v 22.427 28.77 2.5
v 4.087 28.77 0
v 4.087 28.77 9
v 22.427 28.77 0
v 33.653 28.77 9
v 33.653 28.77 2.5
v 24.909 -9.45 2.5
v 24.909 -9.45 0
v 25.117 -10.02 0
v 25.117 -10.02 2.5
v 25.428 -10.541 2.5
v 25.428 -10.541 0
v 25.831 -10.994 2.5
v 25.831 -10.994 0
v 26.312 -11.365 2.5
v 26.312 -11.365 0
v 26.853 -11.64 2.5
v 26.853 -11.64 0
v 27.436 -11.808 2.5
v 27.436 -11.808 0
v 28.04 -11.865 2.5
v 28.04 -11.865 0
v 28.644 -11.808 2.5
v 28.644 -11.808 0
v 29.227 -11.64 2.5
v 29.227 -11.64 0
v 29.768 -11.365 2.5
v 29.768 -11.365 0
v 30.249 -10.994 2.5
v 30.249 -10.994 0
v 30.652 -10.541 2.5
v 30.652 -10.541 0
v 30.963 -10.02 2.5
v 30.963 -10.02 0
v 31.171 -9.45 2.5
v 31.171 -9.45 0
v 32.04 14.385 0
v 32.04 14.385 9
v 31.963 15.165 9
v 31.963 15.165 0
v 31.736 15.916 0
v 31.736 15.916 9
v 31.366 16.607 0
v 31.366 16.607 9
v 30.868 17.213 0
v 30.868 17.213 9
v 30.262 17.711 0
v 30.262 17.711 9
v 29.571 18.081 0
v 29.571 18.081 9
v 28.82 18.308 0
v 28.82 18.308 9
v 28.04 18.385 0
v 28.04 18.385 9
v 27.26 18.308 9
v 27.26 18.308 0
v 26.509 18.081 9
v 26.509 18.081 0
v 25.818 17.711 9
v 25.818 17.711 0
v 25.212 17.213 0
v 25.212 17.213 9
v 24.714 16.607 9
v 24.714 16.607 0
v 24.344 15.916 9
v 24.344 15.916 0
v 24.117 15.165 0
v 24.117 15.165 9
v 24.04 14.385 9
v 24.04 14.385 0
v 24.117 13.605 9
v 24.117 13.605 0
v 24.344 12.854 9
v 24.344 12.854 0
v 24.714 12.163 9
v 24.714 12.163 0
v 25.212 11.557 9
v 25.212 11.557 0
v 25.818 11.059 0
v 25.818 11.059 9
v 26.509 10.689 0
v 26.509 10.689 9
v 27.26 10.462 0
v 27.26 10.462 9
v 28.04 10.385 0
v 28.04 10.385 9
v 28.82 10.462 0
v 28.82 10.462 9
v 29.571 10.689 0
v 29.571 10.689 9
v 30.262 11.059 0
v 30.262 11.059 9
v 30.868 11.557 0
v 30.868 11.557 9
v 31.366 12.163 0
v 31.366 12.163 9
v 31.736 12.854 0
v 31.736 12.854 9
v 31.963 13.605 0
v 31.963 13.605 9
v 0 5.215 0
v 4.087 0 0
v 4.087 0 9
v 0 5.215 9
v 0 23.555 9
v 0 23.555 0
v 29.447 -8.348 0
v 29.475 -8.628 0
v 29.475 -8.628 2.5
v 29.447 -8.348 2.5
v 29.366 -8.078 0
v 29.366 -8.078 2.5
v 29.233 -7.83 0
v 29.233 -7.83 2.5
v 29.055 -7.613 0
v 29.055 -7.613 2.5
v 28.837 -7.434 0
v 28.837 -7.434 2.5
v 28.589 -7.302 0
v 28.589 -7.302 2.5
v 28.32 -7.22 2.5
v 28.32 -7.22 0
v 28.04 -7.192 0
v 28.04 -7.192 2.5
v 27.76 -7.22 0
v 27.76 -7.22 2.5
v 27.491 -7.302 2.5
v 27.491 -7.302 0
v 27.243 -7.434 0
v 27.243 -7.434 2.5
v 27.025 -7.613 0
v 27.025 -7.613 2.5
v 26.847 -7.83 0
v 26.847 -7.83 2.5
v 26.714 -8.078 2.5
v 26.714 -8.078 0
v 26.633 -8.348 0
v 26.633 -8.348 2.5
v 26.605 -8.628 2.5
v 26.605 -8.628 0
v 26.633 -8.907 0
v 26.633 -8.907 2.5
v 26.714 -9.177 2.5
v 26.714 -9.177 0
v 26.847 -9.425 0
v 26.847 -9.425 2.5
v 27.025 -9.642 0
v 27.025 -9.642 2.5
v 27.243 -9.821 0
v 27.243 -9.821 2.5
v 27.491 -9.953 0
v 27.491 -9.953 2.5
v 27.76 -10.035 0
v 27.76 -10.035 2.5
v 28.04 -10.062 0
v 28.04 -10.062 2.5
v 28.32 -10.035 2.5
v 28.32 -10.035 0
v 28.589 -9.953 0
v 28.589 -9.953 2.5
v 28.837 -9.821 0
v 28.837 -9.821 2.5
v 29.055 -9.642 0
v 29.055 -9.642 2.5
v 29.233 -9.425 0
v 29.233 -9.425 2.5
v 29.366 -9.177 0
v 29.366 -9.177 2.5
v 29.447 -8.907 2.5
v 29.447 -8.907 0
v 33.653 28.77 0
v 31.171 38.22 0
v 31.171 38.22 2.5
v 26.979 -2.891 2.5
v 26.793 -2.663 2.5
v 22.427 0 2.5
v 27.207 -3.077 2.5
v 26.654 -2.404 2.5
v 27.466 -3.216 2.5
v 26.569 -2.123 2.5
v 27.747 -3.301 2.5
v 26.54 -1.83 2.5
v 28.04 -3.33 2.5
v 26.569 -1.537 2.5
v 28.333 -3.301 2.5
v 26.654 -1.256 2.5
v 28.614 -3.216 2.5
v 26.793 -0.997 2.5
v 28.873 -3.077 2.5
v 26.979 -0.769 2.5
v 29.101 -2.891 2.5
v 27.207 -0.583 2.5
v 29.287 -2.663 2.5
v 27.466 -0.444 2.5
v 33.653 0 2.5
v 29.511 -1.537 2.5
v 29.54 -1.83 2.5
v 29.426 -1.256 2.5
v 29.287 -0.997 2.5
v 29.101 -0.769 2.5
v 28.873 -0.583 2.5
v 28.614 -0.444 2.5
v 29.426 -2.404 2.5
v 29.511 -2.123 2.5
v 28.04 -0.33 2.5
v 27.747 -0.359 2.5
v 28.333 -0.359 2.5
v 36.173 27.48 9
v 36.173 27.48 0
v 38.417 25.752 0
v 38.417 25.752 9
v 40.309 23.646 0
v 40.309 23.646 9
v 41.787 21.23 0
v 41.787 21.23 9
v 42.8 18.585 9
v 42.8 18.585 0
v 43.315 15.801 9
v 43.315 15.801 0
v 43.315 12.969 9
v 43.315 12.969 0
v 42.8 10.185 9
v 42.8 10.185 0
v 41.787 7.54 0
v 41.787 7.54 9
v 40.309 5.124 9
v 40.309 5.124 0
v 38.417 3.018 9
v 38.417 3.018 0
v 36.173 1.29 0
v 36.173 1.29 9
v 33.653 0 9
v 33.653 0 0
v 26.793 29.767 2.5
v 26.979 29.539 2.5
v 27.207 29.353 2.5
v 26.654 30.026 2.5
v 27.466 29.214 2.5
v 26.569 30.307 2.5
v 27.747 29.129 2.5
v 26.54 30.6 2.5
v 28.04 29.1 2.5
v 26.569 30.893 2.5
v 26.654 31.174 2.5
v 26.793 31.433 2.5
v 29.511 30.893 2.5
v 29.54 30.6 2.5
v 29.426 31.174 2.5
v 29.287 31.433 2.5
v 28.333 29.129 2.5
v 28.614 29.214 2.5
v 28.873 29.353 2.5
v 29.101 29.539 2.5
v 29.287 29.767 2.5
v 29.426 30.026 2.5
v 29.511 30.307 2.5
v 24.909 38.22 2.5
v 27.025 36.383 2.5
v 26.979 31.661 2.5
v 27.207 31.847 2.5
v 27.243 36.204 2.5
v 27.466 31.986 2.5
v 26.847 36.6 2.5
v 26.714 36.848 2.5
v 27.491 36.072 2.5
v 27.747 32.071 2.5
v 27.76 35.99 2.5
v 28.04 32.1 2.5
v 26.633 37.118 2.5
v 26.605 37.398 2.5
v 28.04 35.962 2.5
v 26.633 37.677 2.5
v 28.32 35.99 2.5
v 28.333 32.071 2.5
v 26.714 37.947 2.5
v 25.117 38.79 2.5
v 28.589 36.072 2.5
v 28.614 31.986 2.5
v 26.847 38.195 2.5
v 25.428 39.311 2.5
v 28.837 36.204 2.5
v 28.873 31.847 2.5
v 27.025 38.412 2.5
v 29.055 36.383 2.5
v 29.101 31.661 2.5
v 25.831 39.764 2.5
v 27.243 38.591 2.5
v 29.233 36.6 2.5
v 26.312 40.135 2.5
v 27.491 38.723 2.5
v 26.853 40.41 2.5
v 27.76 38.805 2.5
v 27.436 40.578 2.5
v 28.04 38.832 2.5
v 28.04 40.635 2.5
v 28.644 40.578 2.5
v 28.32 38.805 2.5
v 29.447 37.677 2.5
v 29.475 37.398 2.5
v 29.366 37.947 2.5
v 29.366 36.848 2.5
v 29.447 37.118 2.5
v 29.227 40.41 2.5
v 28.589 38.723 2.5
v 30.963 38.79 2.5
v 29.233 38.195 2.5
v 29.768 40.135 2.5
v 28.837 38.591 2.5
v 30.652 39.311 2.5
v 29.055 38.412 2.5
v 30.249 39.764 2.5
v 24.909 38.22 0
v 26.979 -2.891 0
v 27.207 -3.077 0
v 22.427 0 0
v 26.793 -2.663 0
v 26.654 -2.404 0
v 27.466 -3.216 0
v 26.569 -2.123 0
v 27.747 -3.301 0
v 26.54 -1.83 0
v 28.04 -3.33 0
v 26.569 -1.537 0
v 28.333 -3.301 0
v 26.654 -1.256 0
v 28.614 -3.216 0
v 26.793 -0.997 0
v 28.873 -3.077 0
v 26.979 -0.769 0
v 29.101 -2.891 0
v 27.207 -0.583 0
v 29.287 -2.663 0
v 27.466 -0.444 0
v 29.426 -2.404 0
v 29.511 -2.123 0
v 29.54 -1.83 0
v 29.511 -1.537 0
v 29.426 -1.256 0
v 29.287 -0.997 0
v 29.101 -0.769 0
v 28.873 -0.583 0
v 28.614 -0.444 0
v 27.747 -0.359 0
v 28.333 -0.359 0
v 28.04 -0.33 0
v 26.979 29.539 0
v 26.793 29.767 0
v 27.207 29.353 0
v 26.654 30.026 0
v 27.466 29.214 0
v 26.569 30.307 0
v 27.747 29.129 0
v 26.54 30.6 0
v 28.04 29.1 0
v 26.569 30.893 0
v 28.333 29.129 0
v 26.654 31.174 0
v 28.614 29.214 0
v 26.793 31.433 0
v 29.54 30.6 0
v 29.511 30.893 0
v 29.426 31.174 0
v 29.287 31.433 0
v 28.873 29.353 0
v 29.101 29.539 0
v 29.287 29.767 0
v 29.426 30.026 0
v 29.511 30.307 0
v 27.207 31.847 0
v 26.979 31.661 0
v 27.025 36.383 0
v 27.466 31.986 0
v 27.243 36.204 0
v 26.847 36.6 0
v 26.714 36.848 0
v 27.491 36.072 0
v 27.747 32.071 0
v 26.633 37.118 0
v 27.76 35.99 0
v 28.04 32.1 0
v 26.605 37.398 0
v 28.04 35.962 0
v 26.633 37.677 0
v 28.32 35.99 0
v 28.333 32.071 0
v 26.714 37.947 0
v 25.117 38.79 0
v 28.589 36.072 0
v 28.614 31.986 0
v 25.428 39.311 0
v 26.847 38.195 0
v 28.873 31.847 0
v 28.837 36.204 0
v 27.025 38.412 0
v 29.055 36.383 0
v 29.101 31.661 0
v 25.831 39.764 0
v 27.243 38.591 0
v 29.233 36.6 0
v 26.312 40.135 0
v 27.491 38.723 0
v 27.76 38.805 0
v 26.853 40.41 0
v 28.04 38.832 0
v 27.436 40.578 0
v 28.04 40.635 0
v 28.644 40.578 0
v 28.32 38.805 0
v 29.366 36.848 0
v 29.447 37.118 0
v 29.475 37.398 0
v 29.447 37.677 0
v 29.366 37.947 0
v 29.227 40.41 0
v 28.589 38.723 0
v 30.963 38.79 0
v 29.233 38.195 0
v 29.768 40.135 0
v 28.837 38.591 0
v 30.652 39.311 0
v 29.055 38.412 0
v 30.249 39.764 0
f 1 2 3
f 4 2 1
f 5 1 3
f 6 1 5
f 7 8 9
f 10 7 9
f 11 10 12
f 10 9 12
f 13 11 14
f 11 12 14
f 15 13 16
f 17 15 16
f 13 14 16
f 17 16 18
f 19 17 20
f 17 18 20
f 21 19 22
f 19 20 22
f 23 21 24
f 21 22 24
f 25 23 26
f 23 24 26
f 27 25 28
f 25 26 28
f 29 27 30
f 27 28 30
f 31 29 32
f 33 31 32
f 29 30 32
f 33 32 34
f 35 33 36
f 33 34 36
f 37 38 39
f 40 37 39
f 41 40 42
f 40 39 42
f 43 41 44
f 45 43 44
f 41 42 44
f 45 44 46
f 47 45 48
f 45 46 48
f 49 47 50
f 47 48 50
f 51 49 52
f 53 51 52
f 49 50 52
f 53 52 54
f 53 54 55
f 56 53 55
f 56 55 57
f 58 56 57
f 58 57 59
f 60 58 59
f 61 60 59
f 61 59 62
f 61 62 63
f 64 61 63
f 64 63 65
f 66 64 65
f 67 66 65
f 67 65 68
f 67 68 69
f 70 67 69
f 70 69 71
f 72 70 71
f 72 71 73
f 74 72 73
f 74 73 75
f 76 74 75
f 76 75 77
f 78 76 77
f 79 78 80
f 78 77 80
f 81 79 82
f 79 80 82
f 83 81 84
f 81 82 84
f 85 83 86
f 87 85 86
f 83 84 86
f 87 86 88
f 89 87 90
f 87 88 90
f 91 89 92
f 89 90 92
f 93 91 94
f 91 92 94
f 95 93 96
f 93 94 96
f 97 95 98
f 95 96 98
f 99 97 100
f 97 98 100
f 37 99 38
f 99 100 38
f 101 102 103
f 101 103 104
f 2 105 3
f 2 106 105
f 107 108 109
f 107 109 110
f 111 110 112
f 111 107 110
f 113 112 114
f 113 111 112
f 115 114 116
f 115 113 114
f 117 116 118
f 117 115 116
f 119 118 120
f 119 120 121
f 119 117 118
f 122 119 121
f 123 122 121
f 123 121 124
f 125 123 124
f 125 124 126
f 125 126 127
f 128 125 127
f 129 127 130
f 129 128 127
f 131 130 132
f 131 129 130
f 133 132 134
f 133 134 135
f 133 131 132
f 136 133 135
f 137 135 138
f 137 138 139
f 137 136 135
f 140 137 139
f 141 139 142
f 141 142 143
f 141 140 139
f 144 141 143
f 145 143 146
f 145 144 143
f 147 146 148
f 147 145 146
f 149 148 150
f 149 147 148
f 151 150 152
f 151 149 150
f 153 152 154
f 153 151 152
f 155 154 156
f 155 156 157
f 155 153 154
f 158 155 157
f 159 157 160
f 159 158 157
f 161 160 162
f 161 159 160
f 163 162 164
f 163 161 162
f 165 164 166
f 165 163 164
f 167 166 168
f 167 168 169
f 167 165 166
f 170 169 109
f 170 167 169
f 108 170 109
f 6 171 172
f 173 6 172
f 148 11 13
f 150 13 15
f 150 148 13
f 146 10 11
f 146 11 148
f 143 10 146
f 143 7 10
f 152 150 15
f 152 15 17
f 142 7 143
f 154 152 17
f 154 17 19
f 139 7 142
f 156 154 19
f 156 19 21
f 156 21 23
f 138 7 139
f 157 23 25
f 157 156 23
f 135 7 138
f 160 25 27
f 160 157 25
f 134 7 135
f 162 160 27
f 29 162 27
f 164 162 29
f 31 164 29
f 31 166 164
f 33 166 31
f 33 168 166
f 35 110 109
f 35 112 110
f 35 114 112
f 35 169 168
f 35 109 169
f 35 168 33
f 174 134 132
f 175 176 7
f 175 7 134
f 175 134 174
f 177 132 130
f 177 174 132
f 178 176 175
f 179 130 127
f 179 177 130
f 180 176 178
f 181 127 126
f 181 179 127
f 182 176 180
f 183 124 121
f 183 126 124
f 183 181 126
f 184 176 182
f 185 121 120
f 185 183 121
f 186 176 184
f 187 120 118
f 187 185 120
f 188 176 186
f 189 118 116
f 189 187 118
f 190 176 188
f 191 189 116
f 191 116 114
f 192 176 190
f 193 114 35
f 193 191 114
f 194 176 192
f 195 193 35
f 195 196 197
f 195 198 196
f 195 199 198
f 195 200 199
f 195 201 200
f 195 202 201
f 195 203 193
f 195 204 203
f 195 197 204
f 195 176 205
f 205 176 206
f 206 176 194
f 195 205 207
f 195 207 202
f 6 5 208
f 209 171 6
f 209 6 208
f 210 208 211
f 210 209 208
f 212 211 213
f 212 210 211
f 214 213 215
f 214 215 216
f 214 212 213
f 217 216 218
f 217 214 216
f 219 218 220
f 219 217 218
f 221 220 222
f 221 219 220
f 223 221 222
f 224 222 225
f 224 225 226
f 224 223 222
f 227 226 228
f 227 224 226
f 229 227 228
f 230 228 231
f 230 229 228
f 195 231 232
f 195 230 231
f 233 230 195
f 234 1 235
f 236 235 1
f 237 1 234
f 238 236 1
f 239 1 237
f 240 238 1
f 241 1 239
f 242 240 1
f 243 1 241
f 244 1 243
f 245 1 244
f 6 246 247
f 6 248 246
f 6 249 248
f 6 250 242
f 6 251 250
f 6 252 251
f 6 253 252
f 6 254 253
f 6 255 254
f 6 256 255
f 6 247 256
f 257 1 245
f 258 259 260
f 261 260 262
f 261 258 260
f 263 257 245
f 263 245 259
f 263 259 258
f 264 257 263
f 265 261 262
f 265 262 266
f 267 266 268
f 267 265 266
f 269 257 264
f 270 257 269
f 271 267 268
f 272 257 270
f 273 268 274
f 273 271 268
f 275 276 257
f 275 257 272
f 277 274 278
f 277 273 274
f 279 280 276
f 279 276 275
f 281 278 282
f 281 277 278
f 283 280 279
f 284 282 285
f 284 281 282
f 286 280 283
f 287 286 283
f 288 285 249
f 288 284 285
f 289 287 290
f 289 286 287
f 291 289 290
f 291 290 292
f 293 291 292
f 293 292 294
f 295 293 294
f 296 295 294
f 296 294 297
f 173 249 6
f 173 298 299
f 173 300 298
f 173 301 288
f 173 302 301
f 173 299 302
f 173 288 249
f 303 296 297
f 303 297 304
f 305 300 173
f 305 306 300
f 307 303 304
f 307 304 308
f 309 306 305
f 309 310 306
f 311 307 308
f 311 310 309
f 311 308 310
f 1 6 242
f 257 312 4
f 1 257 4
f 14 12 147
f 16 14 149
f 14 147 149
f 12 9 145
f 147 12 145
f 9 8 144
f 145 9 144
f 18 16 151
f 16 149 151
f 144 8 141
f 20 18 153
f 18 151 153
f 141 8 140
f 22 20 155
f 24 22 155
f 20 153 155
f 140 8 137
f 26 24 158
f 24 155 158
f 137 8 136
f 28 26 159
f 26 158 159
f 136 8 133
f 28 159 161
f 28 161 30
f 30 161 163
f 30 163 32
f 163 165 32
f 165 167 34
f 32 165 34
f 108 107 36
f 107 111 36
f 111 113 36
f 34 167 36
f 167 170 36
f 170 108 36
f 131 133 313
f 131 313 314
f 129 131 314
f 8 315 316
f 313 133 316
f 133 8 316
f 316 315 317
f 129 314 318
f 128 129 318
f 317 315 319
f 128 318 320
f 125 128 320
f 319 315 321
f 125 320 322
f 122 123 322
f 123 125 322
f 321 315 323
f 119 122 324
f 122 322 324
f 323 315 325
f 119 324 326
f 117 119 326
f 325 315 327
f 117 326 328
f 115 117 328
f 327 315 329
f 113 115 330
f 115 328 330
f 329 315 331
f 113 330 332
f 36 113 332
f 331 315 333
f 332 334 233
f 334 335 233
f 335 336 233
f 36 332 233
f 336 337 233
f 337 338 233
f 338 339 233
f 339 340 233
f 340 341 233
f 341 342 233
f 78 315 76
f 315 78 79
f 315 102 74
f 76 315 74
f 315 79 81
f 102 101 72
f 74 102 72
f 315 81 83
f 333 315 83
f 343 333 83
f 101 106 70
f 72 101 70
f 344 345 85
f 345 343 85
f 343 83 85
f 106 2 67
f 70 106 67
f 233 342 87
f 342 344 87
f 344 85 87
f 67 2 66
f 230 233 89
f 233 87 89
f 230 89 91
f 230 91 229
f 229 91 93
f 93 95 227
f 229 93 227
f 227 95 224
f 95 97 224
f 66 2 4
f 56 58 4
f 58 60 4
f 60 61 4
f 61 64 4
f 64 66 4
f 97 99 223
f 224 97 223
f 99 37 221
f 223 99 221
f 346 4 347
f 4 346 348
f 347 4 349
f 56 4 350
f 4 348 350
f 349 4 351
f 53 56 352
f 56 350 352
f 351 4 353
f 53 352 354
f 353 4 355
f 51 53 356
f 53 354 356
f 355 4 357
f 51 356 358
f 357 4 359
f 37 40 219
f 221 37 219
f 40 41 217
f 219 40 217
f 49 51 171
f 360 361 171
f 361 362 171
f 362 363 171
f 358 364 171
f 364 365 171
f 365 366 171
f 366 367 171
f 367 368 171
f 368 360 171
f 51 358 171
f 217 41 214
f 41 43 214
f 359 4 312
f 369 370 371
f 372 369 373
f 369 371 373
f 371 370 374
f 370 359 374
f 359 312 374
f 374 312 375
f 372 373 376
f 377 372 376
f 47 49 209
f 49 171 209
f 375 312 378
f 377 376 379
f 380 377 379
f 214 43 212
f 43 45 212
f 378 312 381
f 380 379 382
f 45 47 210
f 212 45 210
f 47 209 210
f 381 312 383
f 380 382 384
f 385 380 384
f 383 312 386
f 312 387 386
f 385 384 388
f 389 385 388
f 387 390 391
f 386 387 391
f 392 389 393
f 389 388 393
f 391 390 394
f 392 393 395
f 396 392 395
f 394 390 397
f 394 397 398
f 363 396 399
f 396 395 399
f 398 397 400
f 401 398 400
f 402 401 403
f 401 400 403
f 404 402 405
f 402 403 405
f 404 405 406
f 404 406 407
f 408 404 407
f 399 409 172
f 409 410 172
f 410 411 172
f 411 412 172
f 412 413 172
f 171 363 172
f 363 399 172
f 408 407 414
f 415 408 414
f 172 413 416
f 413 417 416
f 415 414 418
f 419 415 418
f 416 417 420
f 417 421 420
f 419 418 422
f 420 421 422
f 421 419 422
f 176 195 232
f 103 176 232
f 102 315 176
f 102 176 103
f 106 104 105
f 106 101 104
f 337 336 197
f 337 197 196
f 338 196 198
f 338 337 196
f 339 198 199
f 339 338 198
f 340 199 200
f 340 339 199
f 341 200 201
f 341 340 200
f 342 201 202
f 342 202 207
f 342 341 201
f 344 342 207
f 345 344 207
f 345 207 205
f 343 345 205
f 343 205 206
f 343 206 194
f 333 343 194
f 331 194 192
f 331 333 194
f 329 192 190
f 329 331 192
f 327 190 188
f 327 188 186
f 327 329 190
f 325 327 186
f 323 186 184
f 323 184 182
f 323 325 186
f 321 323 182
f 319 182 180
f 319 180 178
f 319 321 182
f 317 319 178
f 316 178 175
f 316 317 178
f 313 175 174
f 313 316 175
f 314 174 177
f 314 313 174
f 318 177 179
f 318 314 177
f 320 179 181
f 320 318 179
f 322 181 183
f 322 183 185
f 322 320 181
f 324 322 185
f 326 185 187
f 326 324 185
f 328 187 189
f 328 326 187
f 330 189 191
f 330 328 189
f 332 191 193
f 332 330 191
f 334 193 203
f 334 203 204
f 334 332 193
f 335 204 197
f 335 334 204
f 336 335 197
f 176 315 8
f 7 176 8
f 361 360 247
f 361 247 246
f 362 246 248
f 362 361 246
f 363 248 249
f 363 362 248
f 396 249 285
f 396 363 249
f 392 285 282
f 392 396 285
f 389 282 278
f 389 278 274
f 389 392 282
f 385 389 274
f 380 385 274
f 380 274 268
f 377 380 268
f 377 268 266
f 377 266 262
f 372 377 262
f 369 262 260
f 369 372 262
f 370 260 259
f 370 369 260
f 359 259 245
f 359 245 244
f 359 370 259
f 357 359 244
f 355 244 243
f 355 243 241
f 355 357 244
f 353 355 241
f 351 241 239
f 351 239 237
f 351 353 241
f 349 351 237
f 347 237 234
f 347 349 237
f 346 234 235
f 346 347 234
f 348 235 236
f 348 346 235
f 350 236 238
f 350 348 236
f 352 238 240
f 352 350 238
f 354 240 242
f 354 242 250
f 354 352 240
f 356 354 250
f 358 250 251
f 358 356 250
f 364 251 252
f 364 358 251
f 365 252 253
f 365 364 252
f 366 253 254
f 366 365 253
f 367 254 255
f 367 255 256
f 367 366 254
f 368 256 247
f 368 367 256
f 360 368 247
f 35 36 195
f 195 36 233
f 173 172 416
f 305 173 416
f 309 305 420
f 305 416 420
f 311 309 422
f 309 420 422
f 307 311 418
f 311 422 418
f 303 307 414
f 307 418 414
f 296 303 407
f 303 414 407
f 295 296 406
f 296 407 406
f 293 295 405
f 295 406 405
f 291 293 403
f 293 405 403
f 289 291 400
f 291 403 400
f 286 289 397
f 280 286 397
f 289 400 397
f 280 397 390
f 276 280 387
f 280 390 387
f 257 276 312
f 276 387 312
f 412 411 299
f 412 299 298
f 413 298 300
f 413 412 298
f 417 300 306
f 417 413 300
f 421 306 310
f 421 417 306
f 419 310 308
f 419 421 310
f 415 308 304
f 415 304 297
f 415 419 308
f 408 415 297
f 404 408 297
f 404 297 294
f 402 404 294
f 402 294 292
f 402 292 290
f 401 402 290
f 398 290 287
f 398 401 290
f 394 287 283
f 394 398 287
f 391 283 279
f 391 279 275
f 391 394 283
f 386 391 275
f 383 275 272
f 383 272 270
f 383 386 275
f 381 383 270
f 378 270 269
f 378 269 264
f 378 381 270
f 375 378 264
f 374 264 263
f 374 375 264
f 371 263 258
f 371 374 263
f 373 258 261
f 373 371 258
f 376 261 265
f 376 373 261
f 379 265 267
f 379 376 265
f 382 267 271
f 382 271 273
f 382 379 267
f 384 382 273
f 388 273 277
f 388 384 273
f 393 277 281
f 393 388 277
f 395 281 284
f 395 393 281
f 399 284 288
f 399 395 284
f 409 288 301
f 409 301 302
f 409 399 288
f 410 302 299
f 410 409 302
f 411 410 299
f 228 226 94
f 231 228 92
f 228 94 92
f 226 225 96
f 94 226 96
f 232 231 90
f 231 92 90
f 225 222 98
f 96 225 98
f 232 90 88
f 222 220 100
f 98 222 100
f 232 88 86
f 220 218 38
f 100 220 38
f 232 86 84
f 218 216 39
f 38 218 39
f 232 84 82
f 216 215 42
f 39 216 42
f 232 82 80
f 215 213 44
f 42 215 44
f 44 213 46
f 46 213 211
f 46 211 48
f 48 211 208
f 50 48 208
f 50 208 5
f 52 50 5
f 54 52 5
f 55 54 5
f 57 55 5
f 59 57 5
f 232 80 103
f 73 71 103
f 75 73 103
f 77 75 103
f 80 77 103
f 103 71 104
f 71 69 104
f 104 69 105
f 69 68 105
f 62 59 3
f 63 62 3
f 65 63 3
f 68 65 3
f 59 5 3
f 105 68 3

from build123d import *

# Parameters (mm, degrees)
ESQUISSE1_R             = 1.435
ESQUISSE1_R_2           = 1.5
BOSS_EXTRU_2_DEPTH      = 2.5
BOSS_EXTRU_3_DEPTH      = 6.5
ESQUISSE3_R             = 4
ENL_V_MAT_EXTRU_1_DEPTH = 10


with BuildPart() as part:
    # Esquisse1 → Boss.-Extru.2 (new body)
    with BuildSketch(Plane.XY):
        with BuildLine():
            Line((22.427498376, 0), (24.908638492, -9.449680852))
            ThreePointArc((24.908638492, -9.449680852), (28.04, -11.865), (31.171361508, -9.449680852))
            Line((31.171361508, -9.449680852), (33.652501624, 0))
            ThreePointArc((33.652501624, 0), (43.38, 14.385), (33.652501624, 28.77))
            Line((33.652501624, 28.77), (31.171361508, 38.219680852))
            ThreePointArc((31.171361508, 38.219680852), (28.04, 40.635), (24.908638492, 38.219680852))
            Line((24.908638492, 38.219680852), (22.427498376, 28.77))
            Line((22.427498376, 28.77), (4.087498376, 28.77))
            Line((4.087498376, 28.77), (0, 23.555))
            Line((0, 23.555), (0, 5.215))
            Line((0, 5.215), (4.087498376, 0))
            Line((4.087498376, 0), (22.427498376, 0))
        make_face()
        with Locations((28.04, 37.3975)):
            Circle(ESQUISSE1_R, mode=Mode.SUBTRACT)
        with Locations((28.04, -8.6275)):
            Circle(ESQUISSE1_R, mode=Mode.SUBTRACT)
        with Locations((28.04, 30.6)):
            Circle(ESQUISSE1_R_2, mode=Mode.SUBTRACT)
        with Locations((28.04, -1.83)):
            Circle(ESQUISSE1_R_2, mode=Mode.SUBTRACT)
    extrude(amount=BOSS_EXTRU_2_DEPTH)

    # Esquisse2 → Boss.-Extru.3 (add)
    with BuildSketch(Plane.XY.offset(2.5)):
        with BuildLine():
            Line((4.087498376, 28.77), (33.652501624, 28.77))
            ThreePointArc((33.652501624, 28.77), (43.38, 14.385), (33.652501624, 0))
            Line((33.652501624, 0), (4.087498376, 0))
            Line((4.087498376, 0), (0, 5.215))
            Line((0, 5.215), (0, 23.555))
            Line((0, 23.555), (4.087498376, 28.77))
        make_face()
    extrude(amount=BOSS_EXTRU_3_DEPTH)

    # Esquisse3 → Enlèv. mat.-Extru.1 (cut)
    with BuildSketch(Plane.XY.offset(9)):
        with Locations((28.04, 14.385)):
            Circle(ESQUISSE3_R)
    extrude(amount=-ENL_V_MAT_EXTRU_1_DEPTH, mode=Mode.SUBTRACT)


solid = part.part
